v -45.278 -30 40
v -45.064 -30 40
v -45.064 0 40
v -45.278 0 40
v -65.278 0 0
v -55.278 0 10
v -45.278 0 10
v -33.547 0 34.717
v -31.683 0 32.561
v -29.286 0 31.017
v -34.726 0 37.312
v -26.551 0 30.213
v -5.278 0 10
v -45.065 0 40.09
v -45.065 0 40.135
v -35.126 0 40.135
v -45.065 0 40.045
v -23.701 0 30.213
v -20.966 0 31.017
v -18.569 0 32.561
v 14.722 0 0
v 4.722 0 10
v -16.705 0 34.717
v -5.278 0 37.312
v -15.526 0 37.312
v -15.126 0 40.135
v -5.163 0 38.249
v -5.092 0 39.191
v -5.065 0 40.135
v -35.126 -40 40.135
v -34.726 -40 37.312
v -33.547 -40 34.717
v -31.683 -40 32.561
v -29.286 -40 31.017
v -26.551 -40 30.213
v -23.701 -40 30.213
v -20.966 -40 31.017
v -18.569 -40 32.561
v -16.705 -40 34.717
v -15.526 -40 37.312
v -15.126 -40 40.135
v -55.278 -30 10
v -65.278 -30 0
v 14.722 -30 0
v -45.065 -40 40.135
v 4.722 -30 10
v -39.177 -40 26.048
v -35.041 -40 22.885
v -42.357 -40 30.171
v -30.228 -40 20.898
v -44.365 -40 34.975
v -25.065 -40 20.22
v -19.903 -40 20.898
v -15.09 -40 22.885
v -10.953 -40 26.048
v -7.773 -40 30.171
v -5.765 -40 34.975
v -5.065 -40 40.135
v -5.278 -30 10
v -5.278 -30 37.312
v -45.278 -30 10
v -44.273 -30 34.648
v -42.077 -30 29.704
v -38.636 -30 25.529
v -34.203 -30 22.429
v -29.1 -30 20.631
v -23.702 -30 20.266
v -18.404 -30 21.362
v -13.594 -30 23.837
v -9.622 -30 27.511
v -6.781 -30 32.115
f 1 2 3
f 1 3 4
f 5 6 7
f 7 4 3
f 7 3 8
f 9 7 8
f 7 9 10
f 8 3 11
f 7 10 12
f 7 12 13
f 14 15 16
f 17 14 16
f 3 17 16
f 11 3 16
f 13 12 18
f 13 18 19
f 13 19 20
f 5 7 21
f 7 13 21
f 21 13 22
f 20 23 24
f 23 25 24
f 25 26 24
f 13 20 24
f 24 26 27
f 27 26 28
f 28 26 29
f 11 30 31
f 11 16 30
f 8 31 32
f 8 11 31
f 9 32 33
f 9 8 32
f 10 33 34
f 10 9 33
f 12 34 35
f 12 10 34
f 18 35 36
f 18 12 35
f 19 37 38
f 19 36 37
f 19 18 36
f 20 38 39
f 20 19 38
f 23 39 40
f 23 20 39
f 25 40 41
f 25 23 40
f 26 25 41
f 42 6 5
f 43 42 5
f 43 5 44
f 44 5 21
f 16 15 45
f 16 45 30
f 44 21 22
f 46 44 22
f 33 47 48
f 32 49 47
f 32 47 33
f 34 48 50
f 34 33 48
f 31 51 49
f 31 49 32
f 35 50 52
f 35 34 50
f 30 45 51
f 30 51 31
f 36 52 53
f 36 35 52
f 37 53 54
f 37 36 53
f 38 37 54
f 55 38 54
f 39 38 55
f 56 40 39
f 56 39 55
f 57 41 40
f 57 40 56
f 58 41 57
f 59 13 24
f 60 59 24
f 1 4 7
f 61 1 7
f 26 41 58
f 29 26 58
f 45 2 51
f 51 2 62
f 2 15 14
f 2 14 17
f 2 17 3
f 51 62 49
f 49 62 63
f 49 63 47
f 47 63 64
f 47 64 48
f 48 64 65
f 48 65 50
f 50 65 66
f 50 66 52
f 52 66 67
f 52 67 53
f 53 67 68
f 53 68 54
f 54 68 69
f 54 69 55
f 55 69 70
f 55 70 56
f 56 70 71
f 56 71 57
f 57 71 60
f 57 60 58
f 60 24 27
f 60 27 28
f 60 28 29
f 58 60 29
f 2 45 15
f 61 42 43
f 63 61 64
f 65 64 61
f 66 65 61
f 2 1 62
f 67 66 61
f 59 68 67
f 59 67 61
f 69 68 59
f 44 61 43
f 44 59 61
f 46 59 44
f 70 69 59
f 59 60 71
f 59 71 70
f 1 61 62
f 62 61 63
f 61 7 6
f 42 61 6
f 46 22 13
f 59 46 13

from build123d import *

# Parameters (mm, degrees)
F1_DEPTH = 30
F3_DEPTH = 40
F5_DEPTH = 50.6
F7_DEPTH = 72.9


with BuildPart() as f1:
    # F0 (on Front) → F1 (new body)
    with BuildSketch(Plane.XZ):
        Polygon((-55.277854, 10), (-65.277854, 0), (14.722146, 0), (4.722146, 10), (-5.277854, 10), (-5.277854, 40), (-45.277854, 40), (-45.277854, 10), align=None)
    extrude(amount=F1_DEPTH)

    # F2 (on Front) → F3 (join)
    with BuildSketch(Plane.XZ):
        with BuildLine():
            ThreePointArc((-45.065299, 40.219937), (-25.065299, 20.219937), (-5.065299, 40.219937))
            ThreePointArc((-5.065299, 40.219937), (-25.065299, 60.219937), (-45.065299, 40.219937))
        make_face()
    extrude(amount=F3_DEPTH)

    # F4 (on Front) → F5 (cut)
    with BuildSketch(Plane.XZ):
        with BuildLine():
            ThreePointArc((-35.12593, 40.110912), (-25.12593, 30.110912), (-15.12593, 40.110912))
            ThreePointArc((-15.12593, 40.110912), (-25.12593, 50.110912), (-35.12593, 40.110912))
        make_face()
    extrude(amount=F5_DEPTH, mode=Mode.SUBTRACT)

    # F6 (on Front) → F7 (cut)
    with BuildSketch(Plane.XZ):
        Polygon((-45.997363, 66.289328), (-45.592666, 40.134739), (-1.902011, 40.134739), (-3.919857, 66.289328), align=None)
    extrude(amount=F7_DEPTH, mode=Mode.SUBTRACT)


solid = f1.part
